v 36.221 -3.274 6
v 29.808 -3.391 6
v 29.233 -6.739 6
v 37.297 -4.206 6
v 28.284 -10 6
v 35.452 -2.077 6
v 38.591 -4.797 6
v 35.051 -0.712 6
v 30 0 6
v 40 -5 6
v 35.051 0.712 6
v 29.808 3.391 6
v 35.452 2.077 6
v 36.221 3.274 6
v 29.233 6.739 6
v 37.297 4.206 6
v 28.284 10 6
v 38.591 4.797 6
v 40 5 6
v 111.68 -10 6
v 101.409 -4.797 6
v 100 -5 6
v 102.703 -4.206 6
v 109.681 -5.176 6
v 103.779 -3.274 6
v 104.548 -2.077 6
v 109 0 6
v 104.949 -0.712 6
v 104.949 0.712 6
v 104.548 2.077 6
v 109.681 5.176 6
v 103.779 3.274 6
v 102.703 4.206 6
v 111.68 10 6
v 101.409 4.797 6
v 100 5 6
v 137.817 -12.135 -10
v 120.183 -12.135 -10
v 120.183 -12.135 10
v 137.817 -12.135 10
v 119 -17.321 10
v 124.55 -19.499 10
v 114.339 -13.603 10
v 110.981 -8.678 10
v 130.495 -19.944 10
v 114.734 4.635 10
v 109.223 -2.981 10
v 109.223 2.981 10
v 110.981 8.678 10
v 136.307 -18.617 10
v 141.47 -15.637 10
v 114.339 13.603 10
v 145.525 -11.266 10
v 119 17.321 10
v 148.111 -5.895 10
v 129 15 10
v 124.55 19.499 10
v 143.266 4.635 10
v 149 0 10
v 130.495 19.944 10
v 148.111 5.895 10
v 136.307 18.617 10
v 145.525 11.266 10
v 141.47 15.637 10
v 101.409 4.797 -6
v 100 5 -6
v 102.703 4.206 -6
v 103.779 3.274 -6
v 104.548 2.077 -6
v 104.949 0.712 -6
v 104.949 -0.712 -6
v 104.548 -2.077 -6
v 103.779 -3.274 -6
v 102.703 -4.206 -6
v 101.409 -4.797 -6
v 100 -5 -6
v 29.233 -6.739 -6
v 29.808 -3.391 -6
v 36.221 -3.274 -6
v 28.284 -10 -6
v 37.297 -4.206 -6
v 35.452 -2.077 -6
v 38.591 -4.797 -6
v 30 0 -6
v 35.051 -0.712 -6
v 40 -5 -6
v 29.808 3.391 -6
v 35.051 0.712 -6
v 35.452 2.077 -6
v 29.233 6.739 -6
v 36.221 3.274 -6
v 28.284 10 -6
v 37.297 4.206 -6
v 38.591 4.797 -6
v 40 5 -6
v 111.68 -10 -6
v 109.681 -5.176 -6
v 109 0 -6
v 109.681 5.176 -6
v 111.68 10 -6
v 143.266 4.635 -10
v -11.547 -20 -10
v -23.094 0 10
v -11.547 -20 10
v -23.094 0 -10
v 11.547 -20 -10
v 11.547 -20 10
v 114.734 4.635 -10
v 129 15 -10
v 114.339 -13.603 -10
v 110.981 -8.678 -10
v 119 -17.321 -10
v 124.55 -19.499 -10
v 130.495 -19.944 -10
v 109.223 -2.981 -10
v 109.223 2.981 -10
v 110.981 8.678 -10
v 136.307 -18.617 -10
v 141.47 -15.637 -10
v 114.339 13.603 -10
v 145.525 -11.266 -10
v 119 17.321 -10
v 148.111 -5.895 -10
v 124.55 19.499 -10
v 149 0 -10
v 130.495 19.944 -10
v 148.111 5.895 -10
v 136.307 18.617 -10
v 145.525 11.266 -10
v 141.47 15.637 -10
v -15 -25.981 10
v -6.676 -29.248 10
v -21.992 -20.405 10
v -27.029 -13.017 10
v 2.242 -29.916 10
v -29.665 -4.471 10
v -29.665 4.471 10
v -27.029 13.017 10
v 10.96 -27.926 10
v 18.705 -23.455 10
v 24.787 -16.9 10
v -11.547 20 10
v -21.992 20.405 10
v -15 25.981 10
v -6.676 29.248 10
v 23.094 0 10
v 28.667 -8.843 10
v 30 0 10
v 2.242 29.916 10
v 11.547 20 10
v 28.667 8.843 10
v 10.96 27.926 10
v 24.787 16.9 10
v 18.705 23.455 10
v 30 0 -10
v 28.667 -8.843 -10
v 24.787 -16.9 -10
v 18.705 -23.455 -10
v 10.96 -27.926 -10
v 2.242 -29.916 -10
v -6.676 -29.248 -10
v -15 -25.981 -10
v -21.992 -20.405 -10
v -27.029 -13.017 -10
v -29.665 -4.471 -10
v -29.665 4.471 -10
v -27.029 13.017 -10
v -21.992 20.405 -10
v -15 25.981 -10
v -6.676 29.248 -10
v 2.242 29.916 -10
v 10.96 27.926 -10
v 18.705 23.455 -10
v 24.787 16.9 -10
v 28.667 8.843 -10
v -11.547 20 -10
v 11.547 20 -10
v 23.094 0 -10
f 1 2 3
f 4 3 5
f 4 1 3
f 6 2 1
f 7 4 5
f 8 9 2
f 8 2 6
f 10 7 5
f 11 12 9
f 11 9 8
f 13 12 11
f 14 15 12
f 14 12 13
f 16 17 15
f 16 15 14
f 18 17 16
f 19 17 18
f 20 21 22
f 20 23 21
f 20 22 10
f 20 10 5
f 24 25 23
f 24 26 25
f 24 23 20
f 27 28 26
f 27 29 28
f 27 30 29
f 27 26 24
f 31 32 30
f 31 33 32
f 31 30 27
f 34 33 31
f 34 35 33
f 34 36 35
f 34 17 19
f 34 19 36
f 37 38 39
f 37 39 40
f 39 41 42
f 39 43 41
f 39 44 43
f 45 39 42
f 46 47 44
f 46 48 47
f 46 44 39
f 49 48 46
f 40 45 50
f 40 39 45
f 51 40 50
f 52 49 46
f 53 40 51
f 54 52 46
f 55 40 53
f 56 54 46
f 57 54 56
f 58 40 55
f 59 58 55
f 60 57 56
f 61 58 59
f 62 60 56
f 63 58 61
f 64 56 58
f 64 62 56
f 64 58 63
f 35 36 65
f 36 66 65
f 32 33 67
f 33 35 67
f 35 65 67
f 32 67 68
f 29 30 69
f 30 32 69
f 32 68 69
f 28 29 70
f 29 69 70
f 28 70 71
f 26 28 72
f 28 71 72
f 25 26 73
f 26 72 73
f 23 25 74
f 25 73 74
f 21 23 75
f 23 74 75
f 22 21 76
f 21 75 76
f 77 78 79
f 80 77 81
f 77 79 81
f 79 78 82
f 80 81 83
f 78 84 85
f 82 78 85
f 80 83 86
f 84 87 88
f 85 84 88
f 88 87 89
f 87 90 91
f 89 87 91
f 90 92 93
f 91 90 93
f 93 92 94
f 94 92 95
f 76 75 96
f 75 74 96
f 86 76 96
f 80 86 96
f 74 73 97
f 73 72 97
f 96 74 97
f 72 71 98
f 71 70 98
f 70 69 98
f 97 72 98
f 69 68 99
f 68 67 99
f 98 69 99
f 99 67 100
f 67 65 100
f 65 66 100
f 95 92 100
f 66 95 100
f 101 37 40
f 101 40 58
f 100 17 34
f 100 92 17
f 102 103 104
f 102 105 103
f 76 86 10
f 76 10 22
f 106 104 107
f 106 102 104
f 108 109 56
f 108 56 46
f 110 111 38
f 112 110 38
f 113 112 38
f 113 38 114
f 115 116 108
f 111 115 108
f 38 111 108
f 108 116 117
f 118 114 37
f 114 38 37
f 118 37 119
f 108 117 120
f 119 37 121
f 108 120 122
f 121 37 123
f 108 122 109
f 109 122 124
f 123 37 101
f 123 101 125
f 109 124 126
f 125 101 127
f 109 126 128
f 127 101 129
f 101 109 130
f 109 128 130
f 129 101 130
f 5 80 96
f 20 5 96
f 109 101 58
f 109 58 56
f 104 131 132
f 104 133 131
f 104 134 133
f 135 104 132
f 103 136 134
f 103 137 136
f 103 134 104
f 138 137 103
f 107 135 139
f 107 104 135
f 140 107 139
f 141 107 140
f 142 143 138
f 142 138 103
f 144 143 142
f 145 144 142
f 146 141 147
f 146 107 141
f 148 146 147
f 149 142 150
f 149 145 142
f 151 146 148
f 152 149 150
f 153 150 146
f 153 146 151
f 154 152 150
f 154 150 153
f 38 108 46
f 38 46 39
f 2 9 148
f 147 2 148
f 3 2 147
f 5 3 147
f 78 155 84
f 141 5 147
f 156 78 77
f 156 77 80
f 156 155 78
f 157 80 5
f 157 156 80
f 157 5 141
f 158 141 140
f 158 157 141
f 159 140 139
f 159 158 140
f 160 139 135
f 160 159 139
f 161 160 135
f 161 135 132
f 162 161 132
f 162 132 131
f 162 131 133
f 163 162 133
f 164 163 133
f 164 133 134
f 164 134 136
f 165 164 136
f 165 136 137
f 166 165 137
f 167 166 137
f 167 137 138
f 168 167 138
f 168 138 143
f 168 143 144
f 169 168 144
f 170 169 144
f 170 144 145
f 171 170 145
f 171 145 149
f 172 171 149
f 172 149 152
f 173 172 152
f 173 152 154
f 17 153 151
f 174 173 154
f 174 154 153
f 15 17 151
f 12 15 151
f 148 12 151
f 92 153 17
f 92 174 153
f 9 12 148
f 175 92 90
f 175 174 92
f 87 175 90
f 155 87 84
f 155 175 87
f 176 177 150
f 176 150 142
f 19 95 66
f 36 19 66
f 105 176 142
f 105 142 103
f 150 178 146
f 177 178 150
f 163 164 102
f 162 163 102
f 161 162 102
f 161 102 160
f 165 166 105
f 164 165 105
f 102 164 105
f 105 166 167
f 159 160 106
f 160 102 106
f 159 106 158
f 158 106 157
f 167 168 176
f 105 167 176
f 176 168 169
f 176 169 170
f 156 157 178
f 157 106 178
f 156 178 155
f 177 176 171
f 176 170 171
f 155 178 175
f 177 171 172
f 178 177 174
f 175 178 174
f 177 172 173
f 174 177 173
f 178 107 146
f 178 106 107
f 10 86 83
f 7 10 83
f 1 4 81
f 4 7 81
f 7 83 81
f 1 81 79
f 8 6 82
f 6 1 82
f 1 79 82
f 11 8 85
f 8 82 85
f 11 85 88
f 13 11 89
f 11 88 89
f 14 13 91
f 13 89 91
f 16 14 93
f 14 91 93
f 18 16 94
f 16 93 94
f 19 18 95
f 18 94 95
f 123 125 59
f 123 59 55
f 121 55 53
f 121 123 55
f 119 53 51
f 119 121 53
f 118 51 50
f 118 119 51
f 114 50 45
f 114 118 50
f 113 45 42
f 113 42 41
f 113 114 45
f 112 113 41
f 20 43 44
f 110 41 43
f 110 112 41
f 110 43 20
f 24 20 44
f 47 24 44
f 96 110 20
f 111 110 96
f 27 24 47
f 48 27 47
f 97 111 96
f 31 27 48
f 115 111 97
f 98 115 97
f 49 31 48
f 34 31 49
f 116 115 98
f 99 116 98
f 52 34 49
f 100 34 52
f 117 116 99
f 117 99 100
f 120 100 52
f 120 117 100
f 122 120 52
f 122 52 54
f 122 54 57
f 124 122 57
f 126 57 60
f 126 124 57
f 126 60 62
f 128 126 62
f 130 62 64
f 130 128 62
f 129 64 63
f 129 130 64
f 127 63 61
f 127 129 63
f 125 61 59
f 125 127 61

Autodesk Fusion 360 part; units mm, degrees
sketch "Sketch1" plane through (0, 0, 0) normal (0, 0, 1) x (1, 0, 0)
  circle A0 centre (0, 0) radius 30
  circle A1 centre (129, 0) radius 20
  line L0 (0, 0) -> (0, 0)
  line L1 (0, 0) -> (0, 0)
  line L2 (0, 0) -> (0, 0)
  line L3 (0, 0) -> (0, 0)
  line L4 (0, 0) -> (0, 0)
  line L5 (0, 0) -> (0, 0)
  line L6 (-11.547, 20) -> (-23.094, 0)
  line L7 (-23.094, 0) -> (-11.547, -20)
  line L8 (-11.547, -20) -> (11.547, -20)
  line L9 (11.547, -20) -> (23.094, 0)
  line L10 (23.094, 0) -> (11.547, 20)
  line L11 (11.547, 20) -> (-11.547, 20)
  line L12 (129, 15) -> (114.7342, 4.6353)
  line L13 (114.7342, 4.6353) -> (120.1832, -12.1353)
  line L14 (120.1832, -12.1353) -> (137.8168, -12.1353)
  line L15 (137.8168, -12.1353) -> (143.2658, 4.6353)
  line L16 (143.2658, 4.6353) -> (129, 15)
  line L17 (0, 0) -> (129, 0) construction
  line L18 (28.2843, 10) -> (111.6795, 10)
  line L19 (28.2843, -10) -> (111.6795, -10)
  line L20 (40, 5) -> (100, 5)
  line L21 (40, -5) -> (100, -5)
  arc A2 (40, 5) -> (40, -5) centre (40, 0) ccw
  arc A3 (100, -5) -> (100, 5) centre (100, 0) ccw
  point P0 (129, 0)
  dimension "d1" = 60
  dimension "d2" = 129
  dimension "d3" = 40
  dimension "d4" = 20
  dimension "d5" = 15
extrude "Extrude1" add sketch "Sketch1" along normal mid plane 20 contours A0 | A1 makes body 1 at (25.0013, -16.5811, 3.3333) makes body 2 at (148.9006, -1.9914, -3.3333)
extrude "Extrude2" add sketch "Sketch1" along normal mid plane 12 contours A0 A1 L18 L19 bodies 1 2
sketch "Sketch3" plane through (0, 0, 0) normal (0, 0, 1) x (1, 0, 0)
sketch "Sketch4" plane through (0, 0, 0) normal (0, 0, 1) x (1, 0, 0)
